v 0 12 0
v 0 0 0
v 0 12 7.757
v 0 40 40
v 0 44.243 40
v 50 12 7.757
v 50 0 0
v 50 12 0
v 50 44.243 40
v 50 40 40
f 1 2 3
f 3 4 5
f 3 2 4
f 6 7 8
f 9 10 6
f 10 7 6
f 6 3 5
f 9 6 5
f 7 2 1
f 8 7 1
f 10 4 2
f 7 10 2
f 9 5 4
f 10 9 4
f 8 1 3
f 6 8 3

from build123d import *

# Parameters (mm, degrees)
F1_DEPTH = 50


with BuildPart() as f1:
    # F0 (on Right) → F1 (new body)
    with BuildSketch(Plane.YZ):
        Polygon((40, 40), (0, 0), (4.242641, 0), (12, 7.757359), (44.242641, 40), align=None)
        Polygon((12, 7.757359), (4.242641, 0), (12, 0), align=None)
    extrude(amount=F1_DEPTH)


solid = f1.part
